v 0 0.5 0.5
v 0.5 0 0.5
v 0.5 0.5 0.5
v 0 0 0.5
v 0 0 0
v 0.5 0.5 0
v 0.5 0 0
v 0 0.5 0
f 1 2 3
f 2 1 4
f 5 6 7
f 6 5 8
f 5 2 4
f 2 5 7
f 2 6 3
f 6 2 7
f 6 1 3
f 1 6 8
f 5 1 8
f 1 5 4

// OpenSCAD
// Optional imports
//include <BOSL2/std.scad>

/* [FIRST SECTION] */
// First param instructions.
first_param = .5; // [0:0.1:1]


/* [HIDDEN] */
hidden_var = 1; // [0:0.1:1] // Hidden vars are not shown in customizer but can be provided in a json profile.

module __Customizer_Limit__ () {}  // All following variables are not available for customizing.
$fn = $preview ? 24 : 128;


color("red")
cube([first_param, first_param, first_param]);
